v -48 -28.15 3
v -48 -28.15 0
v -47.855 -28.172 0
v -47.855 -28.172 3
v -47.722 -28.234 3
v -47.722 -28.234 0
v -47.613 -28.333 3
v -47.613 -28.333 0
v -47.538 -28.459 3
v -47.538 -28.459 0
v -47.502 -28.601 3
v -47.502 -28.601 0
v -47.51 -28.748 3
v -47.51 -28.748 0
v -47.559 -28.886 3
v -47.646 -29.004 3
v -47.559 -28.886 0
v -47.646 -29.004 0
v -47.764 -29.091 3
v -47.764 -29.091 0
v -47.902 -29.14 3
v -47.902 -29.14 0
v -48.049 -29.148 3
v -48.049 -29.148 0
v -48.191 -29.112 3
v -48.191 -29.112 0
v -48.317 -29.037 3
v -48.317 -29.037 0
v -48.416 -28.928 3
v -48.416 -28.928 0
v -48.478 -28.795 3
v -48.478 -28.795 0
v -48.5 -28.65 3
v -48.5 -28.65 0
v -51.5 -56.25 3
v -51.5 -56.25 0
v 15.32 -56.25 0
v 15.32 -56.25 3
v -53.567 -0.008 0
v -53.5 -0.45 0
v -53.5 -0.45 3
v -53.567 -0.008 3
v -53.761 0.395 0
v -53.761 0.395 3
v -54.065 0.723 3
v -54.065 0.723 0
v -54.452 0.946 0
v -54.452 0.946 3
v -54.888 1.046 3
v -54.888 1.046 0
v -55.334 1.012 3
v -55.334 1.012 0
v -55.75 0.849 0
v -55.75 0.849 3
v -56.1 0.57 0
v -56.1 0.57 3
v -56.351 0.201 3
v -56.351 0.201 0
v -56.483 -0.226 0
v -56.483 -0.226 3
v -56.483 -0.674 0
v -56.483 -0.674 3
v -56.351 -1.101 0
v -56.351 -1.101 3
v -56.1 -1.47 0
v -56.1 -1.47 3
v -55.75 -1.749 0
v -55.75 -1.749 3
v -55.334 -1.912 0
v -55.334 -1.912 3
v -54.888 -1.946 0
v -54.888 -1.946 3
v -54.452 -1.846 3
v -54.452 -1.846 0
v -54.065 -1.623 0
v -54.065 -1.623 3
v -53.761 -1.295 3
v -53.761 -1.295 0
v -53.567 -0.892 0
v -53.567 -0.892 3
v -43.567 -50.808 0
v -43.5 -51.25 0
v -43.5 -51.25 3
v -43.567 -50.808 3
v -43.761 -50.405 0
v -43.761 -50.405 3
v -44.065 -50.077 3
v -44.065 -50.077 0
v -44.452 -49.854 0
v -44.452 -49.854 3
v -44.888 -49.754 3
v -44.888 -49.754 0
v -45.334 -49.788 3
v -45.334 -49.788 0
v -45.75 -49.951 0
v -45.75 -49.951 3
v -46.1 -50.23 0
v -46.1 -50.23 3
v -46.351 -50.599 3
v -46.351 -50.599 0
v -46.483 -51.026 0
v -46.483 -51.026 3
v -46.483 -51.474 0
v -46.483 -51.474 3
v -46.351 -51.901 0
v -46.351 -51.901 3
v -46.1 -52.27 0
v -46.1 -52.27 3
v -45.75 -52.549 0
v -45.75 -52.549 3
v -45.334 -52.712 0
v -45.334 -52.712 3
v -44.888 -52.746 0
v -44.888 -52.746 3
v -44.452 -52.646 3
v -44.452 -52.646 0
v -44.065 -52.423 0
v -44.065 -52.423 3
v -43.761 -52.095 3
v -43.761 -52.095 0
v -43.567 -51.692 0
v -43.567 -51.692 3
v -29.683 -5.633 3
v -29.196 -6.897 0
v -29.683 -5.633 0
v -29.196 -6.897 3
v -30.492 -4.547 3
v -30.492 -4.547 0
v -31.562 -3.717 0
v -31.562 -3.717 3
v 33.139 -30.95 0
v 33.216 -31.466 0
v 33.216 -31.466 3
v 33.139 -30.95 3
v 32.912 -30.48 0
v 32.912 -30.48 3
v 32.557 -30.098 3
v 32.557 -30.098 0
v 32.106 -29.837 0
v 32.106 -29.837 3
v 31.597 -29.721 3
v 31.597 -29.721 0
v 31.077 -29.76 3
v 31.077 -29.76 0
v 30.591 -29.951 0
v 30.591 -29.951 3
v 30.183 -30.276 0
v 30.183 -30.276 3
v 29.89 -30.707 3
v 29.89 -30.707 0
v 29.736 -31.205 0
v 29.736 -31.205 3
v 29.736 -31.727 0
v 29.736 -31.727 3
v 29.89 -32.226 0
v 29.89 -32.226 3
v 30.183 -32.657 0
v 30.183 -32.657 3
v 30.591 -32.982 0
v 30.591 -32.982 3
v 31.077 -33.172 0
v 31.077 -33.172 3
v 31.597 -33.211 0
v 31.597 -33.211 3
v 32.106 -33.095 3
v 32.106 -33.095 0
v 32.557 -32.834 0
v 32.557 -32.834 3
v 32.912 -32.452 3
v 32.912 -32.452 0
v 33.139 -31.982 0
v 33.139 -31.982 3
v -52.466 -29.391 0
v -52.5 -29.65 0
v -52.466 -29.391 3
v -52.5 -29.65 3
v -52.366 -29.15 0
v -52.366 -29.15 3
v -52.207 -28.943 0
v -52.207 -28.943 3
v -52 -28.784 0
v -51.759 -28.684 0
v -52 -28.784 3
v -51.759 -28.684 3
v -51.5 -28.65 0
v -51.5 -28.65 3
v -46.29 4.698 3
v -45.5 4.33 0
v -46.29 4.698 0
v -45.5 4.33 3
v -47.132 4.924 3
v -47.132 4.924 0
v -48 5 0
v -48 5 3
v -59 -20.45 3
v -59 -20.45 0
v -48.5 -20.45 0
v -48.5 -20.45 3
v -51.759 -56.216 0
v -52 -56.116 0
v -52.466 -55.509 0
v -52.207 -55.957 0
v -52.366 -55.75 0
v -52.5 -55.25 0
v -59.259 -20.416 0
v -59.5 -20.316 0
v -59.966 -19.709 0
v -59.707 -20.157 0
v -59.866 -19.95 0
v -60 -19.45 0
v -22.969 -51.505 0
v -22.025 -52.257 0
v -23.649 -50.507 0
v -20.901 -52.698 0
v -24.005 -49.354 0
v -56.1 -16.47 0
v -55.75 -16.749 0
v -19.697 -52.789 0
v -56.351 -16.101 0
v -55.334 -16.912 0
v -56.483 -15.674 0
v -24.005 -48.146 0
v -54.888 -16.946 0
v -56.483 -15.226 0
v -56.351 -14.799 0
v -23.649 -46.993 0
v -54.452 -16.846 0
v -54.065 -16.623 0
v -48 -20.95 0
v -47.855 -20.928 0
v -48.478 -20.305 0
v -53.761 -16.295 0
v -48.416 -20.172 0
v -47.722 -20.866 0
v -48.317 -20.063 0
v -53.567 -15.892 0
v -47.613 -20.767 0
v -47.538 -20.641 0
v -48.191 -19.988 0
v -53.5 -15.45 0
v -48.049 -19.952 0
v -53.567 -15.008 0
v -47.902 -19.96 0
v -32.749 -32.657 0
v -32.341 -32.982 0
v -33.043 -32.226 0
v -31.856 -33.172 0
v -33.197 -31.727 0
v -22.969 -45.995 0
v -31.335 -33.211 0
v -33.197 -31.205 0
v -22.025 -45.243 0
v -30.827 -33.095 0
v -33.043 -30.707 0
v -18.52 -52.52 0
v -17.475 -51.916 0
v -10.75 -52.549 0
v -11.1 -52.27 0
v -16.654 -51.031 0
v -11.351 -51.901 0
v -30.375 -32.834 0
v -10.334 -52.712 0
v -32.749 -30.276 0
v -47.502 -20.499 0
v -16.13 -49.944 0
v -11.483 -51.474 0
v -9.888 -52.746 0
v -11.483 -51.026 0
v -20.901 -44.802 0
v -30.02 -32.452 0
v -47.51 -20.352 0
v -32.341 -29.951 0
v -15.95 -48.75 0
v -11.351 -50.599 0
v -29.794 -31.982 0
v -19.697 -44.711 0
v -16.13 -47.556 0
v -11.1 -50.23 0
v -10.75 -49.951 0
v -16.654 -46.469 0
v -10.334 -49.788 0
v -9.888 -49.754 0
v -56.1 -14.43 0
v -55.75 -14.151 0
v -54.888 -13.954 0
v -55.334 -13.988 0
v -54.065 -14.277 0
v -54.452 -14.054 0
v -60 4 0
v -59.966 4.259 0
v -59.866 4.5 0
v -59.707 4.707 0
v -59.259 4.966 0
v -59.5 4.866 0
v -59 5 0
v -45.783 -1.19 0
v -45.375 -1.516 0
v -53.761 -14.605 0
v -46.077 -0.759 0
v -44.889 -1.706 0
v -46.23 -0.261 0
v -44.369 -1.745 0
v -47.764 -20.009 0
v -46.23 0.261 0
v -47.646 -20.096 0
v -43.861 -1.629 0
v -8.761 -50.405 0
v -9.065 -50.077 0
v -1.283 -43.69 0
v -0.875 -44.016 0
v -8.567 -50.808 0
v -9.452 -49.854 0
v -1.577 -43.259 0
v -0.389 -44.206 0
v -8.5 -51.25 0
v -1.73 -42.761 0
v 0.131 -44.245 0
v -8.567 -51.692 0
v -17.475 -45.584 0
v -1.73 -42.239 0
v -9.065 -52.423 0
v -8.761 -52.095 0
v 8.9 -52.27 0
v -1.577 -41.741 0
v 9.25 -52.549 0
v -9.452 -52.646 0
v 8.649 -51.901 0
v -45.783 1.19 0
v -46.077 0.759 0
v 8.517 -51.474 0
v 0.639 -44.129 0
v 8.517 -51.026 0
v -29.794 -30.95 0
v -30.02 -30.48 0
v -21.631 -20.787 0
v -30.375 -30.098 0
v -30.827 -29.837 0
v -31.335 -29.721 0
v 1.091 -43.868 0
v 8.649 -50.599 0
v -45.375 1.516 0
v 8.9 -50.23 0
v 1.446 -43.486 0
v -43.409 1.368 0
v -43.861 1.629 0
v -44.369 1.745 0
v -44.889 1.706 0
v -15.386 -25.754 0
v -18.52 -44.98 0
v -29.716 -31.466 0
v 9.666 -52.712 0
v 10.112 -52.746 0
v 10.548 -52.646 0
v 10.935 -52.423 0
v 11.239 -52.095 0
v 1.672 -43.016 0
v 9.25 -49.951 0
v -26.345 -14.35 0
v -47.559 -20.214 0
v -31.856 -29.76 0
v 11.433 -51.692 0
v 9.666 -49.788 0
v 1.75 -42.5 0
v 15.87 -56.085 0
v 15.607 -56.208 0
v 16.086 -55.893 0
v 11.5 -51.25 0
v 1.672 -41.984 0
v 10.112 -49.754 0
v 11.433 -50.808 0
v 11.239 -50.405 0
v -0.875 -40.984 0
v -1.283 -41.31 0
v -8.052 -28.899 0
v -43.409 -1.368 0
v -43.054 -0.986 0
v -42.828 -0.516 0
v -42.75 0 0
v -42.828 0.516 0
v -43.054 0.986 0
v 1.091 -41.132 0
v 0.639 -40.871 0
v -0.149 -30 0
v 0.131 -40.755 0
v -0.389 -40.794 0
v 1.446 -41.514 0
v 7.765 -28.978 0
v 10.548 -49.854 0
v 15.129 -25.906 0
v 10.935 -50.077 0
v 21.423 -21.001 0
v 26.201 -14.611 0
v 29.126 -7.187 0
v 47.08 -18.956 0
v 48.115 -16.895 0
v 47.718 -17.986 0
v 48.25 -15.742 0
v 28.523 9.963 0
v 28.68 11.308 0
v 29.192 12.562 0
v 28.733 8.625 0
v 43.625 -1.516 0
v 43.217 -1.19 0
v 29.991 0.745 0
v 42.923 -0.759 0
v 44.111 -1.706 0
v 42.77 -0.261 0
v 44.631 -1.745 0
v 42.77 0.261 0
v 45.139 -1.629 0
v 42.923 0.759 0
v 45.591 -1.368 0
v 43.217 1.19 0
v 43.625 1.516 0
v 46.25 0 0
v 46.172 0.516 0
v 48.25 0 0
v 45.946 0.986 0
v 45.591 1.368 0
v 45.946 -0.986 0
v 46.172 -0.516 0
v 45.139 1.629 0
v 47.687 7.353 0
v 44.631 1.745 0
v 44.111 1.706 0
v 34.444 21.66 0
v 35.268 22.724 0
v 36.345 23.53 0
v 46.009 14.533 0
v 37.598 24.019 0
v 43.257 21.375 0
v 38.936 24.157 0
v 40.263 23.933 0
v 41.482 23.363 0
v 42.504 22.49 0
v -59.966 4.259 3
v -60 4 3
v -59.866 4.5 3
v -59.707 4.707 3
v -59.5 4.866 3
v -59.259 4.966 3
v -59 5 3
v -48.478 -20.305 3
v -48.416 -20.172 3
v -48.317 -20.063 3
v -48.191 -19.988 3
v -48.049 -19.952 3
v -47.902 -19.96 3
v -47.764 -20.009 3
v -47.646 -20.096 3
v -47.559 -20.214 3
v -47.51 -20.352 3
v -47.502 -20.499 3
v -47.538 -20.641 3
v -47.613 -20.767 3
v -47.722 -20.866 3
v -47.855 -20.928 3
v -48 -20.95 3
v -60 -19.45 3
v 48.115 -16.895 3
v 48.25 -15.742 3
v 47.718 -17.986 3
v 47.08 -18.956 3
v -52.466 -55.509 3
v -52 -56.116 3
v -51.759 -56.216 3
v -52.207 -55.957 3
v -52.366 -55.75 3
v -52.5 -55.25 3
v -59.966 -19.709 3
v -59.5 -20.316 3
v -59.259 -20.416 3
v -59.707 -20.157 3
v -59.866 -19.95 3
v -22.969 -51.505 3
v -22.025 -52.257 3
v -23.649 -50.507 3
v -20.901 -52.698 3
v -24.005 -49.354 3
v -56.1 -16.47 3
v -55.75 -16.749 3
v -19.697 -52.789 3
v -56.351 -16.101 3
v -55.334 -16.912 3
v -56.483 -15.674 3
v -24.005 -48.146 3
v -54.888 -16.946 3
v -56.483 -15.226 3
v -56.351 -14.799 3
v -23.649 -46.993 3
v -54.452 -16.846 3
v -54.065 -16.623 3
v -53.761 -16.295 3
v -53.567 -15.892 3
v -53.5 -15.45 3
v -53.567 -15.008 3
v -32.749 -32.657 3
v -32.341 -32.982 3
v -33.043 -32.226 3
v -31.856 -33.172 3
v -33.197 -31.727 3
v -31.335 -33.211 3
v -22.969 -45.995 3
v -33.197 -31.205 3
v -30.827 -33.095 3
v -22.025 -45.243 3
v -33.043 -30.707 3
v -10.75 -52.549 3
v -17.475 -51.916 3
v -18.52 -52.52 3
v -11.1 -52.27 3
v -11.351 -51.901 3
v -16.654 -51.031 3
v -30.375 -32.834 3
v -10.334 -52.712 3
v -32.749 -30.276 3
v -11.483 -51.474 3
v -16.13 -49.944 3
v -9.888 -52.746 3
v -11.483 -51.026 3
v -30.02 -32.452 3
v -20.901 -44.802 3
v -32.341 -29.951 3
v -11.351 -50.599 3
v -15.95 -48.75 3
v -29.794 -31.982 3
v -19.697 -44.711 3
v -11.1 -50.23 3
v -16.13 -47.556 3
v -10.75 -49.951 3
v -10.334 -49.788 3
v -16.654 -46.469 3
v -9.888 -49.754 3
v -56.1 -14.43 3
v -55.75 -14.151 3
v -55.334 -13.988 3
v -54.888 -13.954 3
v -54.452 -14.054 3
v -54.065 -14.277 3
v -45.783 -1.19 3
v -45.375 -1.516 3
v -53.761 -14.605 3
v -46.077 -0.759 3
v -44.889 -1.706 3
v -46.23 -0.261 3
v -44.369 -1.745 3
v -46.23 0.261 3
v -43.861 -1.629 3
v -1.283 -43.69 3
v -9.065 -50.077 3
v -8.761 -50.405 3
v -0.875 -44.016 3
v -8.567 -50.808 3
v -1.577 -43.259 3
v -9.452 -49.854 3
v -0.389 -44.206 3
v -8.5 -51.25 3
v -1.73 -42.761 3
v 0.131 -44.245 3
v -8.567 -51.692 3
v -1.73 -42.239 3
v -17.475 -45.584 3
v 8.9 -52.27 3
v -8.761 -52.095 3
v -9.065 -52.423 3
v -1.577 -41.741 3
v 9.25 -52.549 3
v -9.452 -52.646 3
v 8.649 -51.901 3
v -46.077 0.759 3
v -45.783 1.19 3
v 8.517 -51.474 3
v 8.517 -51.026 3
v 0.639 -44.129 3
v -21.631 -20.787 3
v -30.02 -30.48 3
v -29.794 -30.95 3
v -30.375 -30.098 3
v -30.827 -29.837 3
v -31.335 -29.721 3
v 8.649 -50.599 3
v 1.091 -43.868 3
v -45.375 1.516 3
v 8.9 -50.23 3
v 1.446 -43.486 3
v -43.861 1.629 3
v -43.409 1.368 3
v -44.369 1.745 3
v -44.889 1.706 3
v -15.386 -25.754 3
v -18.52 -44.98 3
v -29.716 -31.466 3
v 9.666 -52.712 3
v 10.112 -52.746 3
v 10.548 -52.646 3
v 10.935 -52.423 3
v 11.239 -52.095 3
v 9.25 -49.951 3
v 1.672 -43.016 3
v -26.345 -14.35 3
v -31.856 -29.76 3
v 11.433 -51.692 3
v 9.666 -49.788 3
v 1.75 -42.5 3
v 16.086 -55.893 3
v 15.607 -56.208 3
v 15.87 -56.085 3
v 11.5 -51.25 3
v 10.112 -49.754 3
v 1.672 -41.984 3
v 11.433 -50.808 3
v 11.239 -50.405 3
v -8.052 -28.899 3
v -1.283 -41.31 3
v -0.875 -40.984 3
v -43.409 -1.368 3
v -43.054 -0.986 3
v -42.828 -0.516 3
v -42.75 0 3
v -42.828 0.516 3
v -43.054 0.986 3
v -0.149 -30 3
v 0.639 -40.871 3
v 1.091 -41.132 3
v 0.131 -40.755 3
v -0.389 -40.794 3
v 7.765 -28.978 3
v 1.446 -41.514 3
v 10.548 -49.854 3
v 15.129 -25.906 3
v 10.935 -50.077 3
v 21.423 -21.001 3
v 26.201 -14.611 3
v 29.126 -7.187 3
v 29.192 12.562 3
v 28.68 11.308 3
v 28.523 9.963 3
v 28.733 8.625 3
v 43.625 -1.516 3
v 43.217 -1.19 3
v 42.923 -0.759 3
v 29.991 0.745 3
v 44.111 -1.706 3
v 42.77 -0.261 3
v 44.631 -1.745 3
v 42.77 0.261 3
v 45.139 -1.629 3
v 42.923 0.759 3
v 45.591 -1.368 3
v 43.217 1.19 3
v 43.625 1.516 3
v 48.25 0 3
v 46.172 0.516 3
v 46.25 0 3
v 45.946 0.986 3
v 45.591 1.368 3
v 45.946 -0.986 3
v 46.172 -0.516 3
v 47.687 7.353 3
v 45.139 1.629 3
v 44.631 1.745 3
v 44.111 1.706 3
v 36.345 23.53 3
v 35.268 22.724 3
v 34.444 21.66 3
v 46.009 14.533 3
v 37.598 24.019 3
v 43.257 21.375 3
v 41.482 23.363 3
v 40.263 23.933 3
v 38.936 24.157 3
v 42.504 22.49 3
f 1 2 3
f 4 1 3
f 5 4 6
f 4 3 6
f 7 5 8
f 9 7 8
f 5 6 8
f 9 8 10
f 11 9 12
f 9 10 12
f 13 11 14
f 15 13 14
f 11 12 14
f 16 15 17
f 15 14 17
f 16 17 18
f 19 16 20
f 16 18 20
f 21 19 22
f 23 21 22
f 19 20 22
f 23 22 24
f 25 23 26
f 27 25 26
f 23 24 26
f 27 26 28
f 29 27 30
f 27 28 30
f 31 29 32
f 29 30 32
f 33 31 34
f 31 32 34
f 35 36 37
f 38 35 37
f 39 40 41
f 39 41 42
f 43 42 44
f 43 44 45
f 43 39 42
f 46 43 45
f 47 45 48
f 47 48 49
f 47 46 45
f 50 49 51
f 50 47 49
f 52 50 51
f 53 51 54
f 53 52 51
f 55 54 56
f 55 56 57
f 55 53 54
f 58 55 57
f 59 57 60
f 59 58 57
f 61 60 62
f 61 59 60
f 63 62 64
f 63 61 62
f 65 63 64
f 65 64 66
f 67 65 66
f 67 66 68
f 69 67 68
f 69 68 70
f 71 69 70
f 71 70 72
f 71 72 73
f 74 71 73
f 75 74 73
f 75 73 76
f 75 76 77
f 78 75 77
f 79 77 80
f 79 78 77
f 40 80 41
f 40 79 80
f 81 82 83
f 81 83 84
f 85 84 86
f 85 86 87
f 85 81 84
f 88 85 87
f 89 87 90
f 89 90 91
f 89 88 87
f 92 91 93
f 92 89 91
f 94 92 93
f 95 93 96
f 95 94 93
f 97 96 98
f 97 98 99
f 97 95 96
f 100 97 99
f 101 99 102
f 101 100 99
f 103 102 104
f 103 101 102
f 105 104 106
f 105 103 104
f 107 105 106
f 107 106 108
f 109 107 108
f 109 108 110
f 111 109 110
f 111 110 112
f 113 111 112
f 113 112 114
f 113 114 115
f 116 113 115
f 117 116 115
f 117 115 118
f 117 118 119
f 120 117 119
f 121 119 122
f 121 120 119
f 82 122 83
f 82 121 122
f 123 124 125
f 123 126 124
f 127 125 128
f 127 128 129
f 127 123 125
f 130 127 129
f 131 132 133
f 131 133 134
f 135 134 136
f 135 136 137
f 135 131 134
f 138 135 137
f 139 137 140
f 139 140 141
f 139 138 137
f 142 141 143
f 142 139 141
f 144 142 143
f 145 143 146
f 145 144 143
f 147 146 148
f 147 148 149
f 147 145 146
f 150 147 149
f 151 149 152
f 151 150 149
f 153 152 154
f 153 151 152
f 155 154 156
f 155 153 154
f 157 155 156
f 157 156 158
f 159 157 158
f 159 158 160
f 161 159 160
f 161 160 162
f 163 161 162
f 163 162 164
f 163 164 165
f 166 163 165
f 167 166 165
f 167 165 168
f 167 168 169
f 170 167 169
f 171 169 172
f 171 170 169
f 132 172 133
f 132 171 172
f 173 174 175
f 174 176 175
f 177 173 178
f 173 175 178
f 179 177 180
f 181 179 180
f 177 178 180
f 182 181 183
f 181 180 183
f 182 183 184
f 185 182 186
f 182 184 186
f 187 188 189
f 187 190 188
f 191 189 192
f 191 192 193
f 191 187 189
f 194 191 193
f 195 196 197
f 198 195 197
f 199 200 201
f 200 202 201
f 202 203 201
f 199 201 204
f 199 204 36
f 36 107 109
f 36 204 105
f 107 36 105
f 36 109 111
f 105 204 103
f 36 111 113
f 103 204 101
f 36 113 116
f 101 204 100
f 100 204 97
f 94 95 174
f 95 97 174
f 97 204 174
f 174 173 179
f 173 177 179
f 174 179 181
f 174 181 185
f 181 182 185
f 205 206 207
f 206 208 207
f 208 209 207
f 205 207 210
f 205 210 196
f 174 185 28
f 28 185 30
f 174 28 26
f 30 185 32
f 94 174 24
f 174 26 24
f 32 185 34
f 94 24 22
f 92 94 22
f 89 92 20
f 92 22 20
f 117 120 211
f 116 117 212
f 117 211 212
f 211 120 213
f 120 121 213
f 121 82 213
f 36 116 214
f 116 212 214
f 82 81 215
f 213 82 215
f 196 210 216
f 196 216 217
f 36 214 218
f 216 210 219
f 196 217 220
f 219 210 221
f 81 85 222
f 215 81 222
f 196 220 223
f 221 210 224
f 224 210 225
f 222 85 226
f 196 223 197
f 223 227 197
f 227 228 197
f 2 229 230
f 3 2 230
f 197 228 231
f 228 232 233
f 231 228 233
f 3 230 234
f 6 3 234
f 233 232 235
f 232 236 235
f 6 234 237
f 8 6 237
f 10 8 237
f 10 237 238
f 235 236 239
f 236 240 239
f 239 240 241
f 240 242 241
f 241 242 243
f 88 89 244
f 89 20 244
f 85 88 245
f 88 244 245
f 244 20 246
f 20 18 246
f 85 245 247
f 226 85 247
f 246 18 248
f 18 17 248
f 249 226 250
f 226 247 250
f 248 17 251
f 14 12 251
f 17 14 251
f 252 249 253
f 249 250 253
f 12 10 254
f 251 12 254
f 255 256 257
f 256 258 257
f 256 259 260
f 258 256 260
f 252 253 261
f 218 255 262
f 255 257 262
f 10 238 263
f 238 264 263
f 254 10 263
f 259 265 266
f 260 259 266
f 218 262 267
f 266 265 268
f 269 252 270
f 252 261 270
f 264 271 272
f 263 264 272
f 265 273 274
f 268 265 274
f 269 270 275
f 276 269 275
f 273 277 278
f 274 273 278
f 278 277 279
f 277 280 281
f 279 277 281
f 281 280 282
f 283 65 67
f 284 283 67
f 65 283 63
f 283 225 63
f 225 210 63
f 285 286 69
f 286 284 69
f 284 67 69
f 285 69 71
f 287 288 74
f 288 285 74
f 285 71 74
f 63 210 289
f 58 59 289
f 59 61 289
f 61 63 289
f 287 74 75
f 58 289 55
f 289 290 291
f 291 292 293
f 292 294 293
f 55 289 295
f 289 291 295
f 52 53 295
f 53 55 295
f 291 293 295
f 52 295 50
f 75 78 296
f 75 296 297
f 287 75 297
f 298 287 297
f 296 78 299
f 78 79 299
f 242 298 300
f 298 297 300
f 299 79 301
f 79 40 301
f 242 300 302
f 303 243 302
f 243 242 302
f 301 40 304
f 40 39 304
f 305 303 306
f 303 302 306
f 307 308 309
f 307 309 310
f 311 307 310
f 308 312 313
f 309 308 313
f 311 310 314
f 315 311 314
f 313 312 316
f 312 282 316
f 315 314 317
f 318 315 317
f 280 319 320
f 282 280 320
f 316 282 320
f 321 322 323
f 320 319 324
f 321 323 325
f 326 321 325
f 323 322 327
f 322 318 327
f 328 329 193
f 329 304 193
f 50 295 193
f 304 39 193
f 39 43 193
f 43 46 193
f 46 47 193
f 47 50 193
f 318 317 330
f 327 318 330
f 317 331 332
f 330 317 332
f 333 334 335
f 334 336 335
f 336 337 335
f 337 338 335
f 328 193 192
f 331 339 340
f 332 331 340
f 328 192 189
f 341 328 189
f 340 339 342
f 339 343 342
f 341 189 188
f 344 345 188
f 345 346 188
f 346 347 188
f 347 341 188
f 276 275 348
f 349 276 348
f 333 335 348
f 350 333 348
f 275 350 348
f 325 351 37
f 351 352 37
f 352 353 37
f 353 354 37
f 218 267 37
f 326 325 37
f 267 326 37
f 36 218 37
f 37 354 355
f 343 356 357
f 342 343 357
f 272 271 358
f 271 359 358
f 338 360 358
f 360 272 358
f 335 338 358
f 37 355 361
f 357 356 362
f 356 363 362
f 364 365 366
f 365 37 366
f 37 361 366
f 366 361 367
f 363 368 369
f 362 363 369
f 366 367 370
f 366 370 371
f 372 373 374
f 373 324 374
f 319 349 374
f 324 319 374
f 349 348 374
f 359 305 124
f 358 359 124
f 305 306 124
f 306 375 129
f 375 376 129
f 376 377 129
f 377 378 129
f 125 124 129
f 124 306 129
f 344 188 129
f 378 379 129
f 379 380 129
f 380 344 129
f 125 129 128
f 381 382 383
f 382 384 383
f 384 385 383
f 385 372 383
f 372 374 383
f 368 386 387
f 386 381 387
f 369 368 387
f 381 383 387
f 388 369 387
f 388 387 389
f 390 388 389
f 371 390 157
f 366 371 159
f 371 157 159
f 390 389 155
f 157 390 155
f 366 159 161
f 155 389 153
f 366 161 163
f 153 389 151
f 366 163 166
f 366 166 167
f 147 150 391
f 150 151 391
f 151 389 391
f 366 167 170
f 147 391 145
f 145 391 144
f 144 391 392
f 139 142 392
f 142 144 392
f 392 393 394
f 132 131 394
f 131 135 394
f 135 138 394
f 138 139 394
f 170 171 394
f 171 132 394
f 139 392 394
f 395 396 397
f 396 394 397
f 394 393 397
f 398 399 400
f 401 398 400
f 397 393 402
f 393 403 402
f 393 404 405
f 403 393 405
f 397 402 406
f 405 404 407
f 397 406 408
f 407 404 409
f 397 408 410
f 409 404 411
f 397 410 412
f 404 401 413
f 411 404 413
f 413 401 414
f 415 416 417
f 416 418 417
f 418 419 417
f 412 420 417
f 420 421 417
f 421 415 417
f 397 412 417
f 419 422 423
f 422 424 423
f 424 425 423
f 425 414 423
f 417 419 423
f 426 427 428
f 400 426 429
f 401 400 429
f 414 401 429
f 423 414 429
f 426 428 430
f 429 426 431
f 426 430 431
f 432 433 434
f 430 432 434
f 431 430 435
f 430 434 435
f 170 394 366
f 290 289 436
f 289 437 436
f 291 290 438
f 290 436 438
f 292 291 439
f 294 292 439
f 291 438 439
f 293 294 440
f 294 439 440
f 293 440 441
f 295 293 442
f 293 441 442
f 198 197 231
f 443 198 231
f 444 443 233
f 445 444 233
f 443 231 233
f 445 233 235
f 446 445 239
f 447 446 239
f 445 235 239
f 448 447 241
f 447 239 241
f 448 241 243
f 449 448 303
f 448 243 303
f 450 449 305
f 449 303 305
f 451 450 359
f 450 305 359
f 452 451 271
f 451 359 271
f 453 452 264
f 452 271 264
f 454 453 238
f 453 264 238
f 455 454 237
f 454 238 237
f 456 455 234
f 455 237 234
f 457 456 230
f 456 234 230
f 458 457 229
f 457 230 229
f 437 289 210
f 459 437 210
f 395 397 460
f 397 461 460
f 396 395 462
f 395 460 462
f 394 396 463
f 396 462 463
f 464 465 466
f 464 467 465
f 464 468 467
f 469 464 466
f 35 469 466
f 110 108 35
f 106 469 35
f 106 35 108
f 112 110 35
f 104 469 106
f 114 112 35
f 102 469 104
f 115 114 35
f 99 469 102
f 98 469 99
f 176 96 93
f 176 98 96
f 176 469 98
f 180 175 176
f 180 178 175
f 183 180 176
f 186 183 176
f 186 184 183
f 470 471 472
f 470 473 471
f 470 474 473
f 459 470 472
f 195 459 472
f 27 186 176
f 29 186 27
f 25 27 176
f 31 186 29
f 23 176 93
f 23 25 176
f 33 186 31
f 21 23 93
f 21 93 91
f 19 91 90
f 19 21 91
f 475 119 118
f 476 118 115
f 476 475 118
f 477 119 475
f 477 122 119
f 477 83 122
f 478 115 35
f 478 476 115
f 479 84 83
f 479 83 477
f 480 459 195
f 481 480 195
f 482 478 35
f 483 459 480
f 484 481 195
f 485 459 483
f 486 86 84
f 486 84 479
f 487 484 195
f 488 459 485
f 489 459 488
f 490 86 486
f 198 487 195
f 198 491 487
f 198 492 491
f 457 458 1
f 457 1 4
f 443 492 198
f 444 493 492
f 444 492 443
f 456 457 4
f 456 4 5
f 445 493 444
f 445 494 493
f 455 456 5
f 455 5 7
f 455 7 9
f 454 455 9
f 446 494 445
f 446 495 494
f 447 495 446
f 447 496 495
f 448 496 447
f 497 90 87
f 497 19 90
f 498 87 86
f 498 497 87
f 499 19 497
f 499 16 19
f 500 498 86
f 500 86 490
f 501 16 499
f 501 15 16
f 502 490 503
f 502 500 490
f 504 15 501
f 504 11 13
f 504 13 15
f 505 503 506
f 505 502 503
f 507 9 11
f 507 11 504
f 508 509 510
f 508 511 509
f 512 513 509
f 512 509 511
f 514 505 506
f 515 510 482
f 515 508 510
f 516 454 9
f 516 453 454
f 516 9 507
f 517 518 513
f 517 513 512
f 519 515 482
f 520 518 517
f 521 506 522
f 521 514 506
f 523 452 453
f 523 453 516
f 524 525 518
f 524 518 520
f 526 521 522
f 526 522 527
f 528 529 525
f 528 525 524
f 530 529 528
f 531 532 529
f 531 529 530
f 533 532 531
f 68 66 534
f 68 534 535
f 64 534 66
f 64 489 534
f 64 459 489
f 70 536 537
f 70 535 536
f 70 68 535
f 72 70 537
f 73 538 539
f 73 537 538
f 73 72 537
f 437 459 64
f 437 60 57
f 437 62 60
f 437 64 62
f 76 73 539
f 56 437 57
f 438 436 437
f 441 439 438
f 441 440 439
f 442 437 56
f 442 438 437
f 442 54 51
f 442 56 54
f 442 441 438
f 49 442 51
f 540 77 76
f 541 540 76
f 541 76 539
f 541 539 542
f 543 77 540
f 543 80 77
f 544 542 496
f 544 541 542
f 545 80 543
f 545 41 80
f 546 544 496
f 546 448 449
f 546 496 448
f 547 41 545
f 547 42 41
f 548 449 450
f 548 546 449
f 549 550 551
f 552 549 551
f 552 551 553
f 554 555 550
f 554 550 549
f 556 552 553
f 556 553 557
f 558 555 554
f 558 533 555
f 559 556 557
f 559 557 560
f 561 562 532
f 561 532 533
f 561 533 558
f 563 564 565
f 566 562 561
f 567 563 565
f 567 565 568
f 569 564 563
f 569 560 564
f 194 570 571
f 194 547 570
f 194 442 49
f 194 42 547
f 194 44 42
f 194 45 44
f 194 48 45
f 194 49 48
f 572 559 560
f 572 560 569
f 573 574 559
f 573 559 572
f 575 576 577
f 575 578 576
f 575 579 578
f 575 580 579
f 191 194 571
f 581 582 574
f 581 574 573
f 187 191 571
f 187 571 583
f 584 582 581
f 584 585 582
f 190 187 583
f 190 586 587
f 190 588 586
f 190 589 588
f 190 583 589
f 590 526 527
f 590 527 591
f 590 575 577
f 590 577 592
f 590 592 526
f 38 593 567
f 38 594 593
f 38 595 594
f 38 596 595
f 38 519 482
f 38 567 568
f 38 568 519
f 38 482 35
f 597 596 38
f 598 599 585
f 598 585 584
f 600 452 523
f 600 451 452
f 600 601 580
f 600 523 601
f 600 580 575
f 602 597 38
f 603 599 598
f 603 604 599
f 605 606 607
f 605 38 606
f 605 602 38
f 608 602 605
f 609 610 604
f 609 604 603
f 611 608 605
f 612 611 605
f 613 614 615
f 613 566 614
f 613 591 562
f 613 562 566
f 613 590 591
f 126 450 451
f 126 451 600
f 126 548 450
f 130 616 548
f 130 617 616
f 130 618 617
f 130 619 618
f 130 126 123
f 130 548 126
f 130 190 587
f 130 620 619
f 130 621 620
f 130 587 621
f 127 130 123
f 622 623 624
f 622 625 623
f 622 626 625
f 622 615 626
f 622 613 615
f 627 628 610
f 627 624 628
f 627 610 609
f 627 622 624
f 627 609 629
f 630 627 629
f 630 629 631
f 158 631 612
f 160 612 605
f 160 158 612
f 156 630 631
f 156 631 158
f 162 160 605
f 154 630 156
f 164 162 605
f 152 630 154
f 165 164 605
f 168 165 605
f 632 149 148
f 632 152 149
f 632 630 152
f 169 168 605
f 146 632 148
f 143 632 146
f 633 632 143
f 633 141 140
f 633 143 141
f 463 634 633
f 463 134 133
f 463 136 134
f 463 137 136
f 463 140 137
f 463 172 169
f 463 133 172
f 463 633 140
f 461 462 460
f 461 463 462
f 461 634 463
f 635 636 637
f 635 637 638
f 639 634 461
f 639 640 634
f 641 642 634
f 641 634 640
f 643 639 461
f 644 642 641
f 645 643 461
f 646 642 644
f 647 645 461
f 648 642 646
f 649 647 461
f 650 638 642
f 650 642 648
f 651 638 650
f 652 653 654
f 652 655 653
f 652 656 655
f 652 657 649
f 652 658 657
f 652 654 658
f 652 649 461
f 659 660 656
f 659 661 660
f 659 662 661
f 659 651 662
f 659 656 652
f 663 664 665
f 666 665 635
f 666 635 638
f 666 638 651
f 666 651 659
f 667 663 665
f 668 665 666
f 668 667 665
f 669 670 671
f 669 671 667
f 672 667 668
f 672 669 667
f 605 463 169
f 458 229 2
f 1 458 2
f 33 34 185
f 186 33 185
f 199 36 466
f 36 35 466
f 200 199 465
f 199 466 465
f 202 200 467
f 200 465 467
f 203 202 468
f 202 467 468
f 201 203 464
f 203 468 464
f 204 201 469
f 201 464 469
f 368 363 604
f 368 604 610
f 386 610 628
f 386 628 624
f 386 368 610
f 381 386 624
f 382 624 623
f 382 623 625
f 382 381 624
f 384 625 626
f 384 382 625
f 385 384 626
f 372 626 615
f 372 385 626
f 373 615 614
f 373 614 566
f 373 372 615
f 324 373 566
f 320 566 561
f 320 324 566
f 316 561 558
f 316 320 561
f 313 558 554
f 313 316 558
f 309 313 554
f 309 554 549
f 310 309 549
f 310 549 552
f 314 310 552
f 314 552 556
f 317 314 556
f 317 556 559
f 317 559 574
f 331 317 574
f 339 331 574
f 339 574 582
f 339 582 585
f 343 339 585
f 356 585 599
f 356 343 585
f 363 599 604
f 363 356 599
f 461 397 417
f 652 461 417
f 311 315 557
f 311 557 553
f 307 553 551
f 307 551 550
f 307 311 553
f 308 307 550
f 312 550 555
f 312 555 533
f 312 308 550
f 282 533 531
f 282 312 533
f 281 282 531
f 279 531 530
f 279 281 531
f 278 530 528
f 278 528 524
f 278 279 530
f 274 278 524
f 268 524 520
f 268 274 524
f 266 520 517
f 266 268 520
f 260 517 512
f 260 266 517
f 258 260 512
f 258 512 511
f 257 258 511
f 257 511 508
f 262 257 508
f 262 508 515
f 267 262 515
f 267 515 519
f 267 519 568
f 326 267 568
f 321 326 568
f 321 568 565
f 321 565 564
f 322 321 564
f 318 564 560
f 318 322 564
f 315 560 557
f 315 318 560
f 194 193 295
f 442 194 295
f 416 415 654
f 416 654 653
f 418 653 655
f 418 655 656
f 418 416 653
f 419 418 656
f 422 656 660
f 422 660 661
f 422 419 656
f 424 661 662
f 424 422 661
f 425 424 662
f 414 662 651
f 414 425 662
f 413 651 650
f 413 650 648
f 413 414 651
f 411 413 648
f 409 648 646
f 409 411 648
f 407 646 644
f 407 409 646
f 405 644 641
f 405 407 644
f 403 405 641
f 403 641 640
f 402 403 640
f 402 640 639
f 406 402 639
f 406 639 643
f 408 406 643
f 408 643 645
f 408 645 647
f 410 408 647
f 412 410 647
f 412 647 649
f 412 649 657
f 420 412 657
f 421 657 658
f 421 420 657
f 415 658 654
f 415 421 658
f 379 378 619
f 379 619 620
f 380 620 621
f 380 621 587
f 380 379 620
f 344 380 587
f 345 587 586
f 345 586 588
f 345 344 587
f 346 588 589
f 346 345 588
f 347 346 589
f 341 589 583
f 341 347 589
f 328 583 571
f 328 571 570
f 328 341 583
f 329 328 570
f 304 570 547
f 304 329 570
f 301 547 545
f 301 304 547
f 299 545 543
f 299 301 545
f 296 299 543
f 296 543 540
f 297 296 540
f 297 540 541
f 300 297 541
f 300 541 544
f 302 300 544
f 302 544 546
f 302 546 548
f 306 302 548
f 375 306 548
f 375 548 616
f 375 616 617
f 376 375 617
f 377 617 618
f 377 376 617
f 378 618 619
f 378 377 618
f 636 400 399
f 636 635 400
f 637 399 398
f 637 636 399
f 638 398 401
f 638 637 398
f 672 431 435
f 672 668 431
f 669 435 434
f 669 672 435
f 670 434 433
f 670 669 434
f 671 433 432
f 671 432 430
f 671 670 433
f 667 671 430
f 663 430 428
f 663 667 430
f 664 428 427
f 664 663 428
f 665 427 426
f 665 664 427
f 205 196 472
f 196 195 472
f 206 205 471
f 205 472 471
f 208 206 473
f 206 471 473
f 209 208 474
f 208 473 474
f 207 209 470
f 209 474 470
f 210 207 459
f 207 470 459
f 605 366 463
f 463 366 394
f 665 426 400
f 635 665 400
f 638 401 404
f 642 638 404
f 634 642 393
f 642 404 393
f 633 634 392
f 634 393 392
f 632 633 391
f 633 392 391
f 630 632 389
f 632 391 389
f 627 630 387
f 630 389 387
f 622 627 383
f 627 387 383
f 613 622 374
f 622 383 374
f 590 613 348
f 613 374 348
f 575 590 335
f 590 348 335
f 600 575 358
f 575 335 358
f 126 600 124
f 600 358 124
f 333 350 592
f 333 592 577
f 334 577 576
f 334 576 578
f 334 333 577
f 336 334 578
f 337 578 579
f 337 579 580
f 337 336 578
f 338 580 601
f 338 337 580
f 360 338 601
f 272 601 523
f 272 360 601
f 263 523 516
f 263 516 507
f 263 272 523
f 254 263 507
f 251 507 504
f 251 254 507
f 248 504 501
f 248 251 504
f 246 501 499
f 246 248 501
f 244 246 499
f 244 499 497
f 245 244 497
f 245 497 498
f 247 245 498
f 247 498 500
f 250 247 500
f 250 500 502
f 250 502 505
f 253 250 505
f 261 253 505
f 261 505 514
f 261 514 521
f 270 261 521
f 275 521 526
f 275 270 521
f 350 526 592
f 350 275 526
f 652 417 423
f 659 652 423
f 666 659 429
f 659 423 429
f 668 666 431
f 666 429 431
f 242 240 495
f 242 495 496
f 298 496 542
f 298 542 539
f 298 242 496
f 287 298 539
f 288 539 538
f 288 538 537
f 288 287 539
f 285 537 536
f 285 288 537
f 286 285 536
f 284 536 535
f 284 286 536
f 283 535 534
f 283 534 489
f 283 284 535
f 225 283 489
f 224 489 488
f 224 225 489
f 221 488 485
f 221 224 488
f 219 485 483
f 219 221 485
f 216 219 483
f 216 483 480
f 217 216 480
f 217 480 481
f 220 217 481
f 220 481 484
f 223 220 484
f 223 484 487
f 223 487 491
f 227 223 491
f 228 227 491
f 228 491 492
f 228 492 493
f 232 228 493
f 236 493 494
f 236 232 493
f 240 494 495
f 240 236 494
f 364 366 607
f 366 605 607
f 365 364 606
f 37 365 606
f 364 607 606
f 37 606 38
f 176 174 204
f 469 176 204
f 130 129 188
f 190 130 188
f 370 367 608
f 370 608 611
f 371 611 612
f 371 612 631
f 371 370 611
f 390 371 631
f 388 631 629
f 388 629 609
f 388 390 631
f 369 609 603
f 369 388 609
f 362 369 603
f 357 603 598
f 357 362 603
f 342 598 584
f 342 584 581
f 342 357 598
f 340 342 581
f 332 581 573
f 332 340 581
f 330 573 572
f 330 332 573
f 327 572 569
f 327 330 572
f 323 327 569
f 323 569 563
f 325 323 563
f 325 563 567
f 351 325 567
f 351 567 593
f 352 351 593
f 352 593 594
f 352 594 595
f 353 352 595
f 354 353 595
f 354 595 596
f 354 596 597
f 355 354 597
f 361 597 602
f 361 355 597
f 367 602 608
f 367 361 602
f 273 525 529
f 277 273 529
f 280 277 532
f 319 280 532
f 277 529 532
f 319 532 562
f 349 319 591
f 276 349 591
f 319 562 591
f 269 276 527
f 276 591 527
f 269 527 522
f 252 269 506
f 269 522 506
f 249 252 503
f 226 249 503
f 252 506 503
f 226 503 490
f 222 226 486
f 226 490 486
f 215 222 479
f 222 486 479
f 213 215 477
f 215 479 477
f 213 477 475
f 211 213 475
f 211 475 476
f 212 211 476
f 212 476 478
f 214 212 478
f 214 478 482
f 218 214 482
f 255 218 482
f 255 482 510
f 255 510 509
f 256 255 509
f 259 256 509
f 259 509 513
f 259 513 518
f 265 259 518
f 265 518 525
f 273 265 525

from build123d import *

# Parameters (mm, degrees)
SKETCH_1_R          = 1.5
SKETCH_1_R_2        = 1.75
EXTRUDE_1_DEPTH     = 3
FILLET_1_R          = 5
SKETCH_3_R          = 0.5
CUT_EXTRUDE_1_DEPTH = 10
SKETCH_4_R          = 4.05
CUT_EXTRUDE_2_DEPTH = 10
FILLET_2_R          = 1


with BuildPart() as part:
    # 草图1 → 凸台-拉伸1 (new body)
    with BuildSketch(Plane.XY):
        with BuildLine():
            Line((48.25, -17.561563803), (48.25, 0))
            ThreePointArc((48.25, 0), (45.781945765, 15.234038926), (38.630271835, 28.909593528))
            Line((38.630271835, 28.909593528), (28.062669438, 10.605969263))
            ThreePointArc((28.062669438, 10.605969263), (7.764571353, -28.977774789), (-29.605969263, -4.846295906))
            Line((-29.605969263, -4.846295906), (-46.660254038, 5))
            Line((-46.660254038, 5), (-60, 5))
            Line((-60, 5), (-60, -20.45))
            Line((-60, -20.45), (-48, -20.45))
            Line((-48, -20.45), (-48, -28.65))
            Line((-48, -28.65), (-52.5, -28.65))
            Line((-52.5, -28.65), (-52.5, -56.25))
            Line((-52.5, -56.25), (-29.605969263, -56.25))
            Line((-29.605969263, -56.25), (15.786547457, -56.25))
            Line((15.786547457, -56.25), (48.25, -17.561563803))
        make_face()
        with Locations((-45, -51.25)):
            Circle(SKETCH_1_R, mode=Mode.SUBTRACT)
        with Locations((-10, -51.25)):
            Circle(SKETCH_1_R, mode=Mode.SUBTRACT)
        with Locations((-55, -15.45)):
            Circle(SKETCH_1_R, mode=Mode.SUBTRACT)
        with Locations((-31.466251763, -31.466251763)):
            Circle(SKETCH_1_R_2, mode=Mode.SUBTRACT)
        with Locations((10, -51.25)):
            Circle(SKETCH_1_R, mode=Mode.SUBTRACT)
        with Locations((0, -42.5)):
            Circle(SKETCH_1_R_2, mode=Mode.SUBTRACT)
        with Locations((31.466251763, -31.466251763)):
            Circle(SKETCH_1_R_2, mode=Mode.SUBTRACT)
        with Locations((-55, -0.45)):
            Circle(SKETCH_1_R, mode=Mode.SUBTRACT)
        with Locations((-44.5, 0)):
            Circle(SKETCH_1_R_2, mode=Mode.SUBTRACT)
        with Locations((44.5, 0)):
            Circle(SKETCH_1_R_2, mode=Mode.SUBTRACT)
    extrude(amount=EXTRUDE_1_DEPTH)

    # 圆角1
    fillet_1_edges = [part.edges().sort_by_distance(p)[0] for p in [
        (48.25, -17.561563803, 1.5),
        (-46.660254038, 5, 1.5),
        (-29.605969263, -4.846295906, 1.5),
        (28.062669438, 10.605969263, 1.5),
        (38.630271835, 28.909593528, 1.5),
    ]]
    fillet(fillet_1_edges, radius=FILLET_1_R)

    # 草图3 → 切除-拉伸1 (cut)
    with BuildSketch(Plane(origin=(0, 0, 0), x_dir=(-1, 0, 0), z_dir=(0, 0, -1))):
        with Locations((48, -20.45)):
            Circle(SKETCH_3_R)
        with Locations((48, -28.65)):
            Circle(SKETCH_3_R)
    extrude(amount=-CUT_EXTRUDE_1_DEPTH, mode=Mode.SUBTRACT)

    # 草图4 → 切除-拉伸2 (cut)
    with BuildSketch(Plane.XY.offset(3)):
        with Locations((-20, -48.75)):
            Circle(SKETCH_4_R)
    extrude(amount=-CUT_EXTRUDE_2_DEPTH, mode=Mode.SUBTRACT)

    # 圆角2
    fillet_2_edges = [part.edges().sort_by_distance(p)[0] for p in [
        (15.786547457, -56.25, 1.5),
        (-52.5, -56.25, 1.5),
        (-52.5, -28.65, 1.5),
        (-60, -20.45, 1.5),
        (-60, 5, 1.5),
    ]]
    fillet(fillet_2_edges, radius=FILLET_2_R)


solid = part.part
